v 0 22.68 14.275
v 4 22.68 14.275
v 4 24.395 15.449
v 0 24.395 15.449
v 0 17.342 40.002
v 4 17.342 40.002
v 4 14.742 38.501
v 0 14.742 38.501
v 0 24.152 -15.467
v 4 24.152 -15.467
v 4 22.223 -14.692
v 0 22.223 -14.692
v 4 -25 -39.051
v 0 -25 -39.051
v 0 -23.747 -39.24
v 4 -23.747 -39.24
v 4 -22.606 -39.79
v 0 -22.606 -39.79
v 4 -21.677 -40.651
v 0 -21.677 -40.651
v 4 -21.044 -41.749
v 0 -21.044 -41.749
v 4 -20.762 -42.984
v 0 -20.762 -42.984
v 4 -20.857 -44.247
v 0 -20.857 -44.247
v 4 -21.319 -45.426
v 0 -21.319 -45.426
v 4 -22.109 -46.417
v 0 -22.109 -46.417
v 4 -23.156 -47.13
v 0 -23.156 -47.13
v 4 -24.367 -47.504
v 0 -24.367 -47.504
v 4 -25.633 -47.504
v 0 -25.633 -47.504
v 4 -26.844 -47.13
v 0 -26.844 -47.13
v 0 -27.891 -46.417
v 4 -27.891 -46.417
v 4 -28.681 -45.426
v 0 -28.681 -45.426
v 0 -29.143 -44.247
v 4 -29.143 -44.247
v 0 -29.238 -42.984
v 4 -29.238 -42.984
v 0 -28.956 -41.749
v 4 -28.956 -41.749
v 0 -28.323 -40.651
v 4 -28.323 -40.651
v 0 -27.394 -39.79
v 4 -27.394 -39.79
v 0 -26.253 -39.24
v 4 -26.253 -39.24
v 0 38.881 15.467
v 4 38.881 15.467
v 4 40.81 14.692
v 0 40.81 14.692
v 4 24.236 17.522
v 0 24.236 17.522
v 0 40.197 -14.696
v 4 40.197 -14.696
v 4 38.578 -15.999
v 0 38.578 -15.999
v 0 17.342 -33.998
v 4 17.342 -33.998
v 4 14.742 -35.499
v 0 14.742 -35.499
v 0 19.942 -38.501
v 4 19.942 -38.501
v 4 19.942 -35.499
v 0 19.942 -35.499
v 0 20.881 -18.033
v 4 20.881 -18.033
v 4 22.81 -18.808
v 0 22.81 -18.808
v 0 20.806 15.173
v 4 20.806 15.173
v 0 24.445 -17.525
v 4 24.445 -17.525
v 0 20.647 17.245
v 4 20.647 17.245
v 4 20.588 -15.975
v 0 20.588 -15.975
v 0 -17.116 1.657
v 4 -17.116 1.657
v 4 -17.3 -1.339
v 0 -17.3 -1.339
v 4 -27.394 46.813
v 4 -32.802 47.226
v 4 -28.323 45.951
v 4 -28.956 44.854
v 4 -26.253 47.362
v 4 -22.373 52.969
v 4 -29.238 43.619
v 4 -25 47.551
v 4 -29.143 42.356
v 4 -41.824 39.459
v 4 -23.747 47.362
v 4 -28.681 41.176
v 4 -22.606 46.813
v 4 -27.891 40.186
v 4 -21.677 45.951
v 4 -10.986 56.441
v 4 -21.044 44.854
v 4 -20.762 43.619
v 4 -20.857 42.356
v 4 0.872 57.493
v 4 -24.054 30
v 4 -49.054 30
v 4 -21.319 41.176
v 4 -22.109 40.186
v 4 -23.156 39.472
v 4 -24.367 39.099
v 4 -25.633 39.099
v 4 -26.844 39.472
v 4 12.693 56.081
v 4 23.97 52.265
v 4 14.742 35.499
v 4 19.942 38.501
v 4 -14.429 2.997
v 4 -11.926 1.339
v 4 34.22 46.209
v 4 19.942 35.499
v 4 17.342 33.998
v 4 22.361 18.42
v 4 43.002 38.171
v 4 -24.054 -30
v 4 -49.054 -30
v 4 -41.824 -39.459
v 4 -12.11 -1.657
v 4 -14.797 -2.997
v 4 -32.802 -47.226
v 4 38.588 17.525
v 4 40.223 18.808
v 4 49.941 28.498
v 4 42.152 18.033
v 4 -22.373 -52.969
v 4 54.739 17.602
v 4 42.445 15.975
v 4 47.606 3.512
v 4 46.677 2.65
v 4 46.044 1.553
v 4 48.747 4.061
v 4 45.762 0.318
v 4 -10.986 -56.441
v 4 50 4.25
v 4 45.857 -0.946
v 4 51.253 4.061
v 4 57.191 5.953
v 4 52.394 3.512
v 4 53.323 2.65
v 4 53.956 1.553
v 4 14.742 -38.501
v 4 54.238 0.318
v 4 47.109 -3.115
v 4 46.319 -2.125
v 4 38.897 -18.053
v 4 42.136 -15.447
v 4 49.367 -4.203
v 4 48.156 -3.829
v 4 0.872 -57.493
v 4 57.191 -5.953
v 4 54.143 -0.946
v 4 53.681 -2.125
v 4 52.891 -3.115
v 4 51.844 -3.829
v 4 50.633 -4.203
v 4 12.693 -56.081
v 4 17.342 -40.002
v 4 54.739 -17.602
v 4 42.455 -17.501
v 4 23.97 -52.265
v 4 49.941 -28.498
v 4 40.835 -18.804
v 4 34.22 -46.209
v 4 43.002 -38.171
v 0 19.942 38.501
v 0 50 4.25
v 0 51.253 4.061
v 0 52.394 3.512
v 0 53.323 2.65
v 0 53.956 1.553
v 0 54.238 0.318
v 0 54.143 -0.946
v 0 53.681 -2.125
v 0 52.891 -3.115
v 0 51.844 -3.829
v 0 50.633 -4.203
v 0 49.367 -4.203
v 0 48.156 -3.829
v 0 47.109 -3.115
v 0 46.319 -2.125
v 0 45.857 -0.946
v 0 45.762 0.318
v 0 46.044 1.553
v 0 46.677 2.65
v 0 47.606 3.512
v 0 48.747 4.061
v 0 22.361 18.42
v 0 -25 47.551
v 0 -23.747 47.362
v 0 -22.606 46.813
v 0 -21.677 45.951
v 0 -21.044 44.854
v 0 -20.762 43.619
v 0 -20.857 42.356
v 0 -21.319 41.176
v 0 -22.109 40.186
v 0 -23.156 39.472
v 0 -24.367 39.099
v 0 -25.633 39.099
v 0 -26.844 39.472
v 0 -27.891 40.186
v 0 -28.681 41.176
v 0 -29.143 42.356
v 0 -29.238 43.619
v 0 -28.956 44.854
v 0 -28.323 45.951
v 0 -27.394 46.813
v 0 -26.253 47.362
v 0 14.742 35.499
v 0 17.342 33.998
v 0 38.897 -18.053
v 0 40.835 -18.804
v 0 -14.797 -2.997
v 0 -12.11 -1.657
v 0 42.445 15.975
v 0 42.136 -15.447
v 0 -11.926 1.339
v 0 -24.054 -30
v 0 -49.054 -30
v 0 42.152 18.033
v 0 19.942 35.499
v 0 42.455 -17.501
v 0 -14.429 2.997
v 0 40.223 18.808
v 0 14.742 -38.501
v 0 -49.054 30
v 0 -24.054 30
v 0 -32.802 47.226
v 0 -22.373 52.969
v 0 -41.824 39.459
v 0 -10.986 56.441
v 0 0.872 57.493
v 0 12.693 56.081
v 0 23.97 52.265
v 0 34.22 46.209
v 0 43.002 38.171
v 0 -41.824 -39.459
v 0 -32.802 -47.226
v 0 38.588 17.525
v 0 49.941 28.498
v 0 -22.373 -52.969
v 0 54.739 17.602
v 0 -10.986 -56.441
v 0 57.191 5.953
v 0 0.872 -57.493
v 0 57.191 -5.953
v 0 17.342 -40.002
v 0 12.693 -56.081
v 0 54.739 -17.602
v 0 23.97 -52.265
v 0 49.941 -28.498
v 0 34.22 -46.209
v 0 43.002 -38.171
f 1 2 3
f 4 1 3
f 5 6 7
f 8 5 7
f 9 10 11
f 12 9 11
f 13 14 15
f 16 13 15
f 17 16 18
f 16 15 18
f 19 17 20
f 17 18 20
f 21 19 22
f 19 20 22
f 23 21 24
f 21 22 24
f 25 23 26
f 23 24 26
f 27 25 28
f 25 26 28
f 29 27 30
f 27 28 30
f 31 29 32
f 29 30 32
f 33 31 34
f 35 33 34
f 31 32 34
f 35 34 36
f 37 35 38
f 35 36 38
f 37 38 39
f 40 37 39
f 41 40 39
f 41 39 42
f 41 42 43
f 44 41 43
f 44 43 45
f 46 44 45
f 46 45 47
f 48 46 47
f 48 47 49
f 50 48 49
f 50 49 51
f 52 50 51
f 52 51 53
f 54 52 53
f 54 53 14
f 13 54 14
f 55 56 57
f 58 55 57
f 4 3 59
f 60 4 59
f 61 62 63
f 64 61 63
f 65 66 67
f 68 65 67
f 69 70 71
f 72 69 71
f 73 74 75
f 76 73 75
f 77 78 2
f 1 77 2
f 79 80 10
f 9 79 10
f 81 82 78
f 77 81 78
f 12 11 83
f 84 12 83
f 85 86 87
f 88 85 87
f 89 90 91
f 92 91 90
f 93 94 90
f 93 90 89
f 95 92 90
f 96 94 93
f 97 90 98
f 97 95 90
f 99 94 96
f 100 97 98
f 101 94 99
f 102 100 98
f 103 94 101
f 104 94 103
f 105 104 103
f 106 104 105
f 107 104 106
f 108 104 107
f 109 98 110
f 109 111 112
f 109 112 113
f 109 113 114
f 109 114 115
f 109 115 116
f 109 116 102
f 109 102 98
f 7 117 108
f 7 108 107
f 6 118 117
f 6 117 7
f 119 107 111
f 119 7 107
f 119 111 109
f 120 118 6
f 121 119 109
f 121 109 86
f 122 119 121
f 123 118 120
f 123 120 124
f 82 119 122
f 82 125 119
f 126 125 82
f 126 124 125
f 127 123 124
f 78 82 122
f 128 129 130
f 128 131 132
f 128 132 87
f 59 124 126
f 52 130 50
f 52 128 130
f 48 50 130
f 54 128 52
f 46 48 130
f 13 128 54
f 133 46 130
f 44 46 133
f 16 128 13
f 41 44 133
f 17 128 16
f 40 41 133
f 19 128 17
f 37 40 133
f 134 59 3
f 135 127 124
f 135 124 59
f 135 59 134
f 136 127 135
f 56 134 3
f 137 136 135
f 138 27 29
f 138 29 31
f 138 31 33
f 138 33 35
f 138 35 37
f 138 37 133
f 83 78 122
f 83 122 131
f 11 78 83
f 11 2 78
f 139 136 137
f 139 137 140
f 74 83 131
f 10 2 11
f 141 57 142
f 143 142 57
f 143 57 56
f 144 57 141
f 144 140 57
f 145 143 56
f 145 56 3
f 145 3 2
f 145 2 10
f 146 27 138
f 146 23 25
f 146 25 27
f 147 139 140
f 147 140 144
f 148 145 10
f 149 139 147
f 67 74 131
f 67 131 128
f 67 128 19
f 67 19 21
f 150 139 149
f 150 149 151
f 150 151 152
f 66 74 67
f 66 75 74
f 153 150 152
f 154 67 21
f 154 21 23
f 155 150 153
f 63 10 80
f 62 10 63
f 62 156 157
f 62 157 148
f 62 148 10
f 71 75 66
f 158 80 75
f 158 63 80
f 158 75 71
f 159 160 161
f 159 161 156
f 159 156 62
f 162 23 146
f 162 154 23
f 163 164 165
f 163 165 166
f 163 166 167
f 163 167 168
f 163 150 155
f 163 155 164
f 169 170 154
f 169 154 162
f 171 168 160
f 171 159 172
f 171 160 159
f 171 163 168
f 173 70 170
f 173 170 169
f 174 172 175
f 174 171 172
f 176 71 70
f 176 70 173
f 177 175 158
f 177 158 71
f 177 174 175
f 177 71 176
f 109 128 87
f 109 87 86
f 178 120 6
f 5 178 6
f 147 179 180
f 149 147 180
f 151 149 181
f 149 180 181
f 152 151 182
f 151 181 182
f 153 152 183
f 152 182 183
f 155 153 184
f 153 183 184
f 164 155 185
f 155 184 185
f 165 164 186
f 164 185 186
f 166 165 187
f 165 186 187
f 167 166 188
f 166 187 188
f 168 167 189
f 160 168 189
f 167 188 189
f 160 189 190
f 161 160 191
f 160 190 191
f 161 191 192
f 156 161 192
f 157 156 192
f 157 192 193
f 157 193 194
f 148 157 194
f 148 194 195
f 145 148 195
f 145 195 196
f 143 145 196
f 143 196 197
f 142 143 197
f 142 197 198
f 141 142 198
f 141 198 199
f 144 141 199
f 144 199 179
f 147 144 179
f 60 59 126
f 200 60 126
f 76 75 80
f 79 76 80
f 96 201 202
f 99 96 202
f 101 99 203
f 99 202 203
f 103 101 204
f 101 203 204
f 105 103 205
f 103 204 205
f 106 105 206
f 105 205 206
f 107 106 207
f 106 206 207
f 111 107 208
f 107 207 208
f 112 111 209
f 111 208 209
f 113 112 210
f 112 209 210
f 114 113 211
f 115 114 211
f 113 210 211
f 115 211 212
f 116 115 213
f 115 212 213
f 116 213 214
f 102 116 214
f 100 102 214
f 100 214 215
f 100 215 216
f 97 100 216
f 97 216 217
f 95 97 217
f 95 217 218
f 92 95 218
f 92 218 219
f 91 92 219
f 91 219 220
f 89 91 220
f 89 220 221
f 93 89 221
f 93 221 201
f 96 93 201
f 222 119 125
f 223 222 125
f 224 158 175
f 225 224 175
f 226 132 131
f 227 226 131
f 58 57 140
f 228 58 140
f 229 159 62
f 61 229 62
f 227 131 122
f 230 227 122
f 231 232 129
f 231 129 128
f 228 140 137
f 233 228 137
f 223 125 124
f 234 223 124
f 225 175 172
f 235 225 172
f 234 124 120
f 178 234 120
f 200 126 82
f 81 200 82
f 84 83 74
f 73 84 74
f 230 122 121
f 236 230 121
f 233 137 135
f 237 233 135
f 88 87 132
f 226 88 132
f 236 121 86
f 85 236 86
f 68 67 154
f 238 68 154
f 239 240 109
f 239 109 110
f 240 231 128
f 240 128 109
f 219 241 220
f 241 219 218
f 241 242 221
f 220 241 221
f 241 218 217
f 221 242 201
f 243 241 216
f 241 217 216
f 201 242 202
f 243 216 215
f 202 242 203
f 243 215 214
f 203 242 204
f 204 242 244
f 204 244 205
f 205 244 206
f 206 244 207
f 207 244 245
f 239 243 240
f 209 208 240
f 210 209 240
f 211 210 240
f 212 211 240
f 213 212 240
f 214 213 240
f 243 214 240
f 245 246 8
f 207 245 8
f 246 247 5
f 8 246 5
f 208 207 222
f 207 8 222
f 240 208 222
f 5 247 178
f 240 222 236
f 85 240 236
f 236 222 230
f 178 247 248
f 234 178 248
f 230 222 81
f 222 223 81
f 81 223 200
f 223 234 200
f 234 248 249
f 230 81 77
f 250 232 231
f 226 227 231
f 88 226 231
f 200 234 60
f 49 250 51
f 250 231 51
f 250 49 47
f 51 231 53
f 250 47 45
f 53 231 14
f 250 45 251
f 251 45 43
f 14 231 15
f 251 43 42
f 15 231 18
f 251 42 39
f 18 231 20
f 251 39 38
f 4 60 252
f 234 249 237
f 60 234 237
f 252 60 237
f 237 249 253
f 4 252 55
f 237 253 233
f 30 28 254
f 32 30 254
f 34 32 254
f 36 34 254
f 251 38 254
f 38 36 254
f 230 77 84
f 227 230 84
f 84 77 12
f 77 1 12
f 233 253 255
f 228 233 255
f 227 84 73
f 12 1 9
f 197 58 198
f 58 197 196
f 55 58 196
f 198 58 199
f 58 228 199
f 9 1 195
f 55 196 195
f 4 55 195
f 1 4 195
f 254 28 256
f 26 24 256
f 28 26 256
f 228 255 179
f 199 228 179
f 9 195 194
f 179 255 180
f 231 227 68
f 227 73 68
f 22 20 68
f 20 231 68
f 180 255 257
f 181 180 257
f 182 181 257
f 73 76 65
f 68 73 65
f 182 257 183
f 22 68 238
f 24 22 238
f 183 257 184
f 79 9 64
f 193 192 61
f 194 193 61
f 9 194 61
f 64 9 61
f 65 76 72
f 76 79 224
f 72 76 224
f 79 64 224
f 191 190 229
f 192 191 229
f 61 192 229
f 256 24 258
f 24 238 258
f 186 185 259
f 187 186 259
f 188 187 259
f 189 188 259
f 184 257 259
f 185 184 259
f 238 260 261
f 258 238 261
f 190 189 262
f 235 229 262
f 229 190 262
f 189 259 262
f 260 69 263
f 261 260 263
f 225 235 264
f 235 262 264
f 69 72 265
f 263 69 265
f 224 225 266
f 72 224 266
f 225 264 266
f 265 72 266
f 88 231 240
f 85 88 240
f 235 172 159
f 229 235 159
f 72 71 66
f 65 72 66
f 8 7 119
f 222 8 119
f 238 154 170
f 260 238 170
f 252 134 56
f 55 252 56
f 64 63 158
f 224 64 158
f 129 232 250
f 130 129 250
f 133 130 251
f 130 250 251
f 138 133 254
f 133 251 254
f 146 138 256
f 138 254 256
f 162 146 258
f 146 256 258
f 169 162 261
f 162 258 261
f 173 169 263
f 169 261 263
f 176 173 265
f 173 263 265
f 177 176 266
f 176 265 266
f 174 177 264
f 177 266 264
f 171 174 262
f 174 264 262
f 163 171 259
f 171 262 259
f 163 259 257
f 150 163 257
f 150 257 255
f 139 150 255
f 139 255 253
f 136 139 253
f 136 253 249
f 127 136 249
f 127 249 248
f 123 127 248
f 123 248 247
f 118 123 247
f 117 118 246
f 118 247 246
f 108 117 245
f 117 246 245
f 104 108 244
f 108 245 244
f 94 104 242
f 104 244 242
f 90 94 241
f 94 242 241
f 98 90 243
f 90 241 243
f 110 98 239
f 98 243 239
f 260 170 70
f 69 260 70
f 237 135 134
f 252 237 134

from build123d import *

# Parameters (mm, degrees)
SKETCH1_R           = 57.5
BOSS_EXTRUDE1_DEPTH = 4
SKETCH2_R           = 4.25
CUT_EXTRUDE1_DEPTH  = 82.415600471
CUT_EXTRUDE2_DEPTH  = 82.415600471
CUT_EXTRUDE3_DEPTH  = 82.415600471


with BuildPart() as part:
    # Sketch1 → Boss-Extrude1 (new body)
    with BuildSketch(Plane(origin=(0, 0, 0), x_dir=(0, 0, -1), z_dir=(1, 0, 0))):
        Circle(SKETCH1_R)
    extrude(amount=BOSS_EXTRUDE1_DEPTH)

    # Sketch2 → Cut-Extrude1 (cut, through all)
    with BuildSketch(Plane.ZY):
        with Locations((0, 50)):
            Circle(SKETCH2_R)
        with Locations((43.301270189, -25)):
            Circle(SKETCH2_R)
        with Locations((-43.301270189, -25)):
            Circle(SKETCH2_R)
    extrude(amount=-CUT_EXTRUDE1_DEPTH, mode=Mode.SUBTRACT)

    # Sketch3 → Cut-Extrude2 (cut, through all)
    with BuildSketch(Plane.ZY):
        with BuildLine():
            Line((-30, -49.053542176), (-30, -24.053542176))
            Line((-30, -24.053542176), (30, -24.053542176))
            Line((30, -24.053542176), (30, -49.053542176))
            ThreePointArc((30, -49.053542176), (0, -57.5), (-30, -49.053542176))
        make_face()
    extrude(amount=-CUT_EXTRUDE2_DEPTH, mode=Mode.SUBTRACT)

    # Sketch4 → Cut-Extrude3 (cut, through all)
    with BuildSketch(Plane(origin=(4, 0, 0), x_dir=(0, 0, -1), z_dir=(1, 0, 0))):
        Polygon((15.999329975, 38.578303843), (18.05316756, 38.897288443), (18.803837585, 40.835456267), (17.500670025, 42.454639491), (15.44683244, 42.13565489), (14.696162415, 40.197487066), align=None)
        Polygon((-17.524724067, 38.587792684), (-15.467077039, 38.881201452), (-14.692352971, 40.809880435), (-15.975275933, 42.44515065), (-18.032922961, 42.151741882), (-18.807647029, 40.223062899), align=None)
        Polygon((15.975275933, 20.587792684), (18.032922961, 20.881201452), (18.807647029, 22.809880435), (17.524724067, 24.44515065), (15.467077039, 24.151741882), (14.692352971, 22.223062899), align=None)
        Polygon((-17.245318548, 20.646539693), (-15.172985813, 20.806029616), (-14.27494177, 22.680467371), (-15.449230462, 24.395415203), (-17.521563197, 24.235925281), (-18.41960724, 22.361487526), align=None)
        Polygon((33.9977786, 17.342133915), (35.4988893, 14.742133915), (38.5011107, 14.742133915), (40.0022214, 17.342133915), (38.5011107, 19.942133915), (35.4988893, 19.942133915), align=None)
        Polygon((-40.0022214, 17.342133915), (-38.5011107, 14.742133915), (-35.4988893, 14.742133915), (-33.9977786, 17.342133915), (-35.4988893, 19.942133915), (-38.5011107, 19.942133915), align=None)
        Polygon((-1.657389197, -17.116294048), (1.339206641, -17.299996833), (2.996595839, -14.796720104), (1.657389197, -12.109740591), (-1.339206641, -11.926037806), (-2.996595839, -14.429314535), align=None)
    extrude(amount=-CUT_EXTRUDE3_DEPTH, mode=Mode.SUBTRACT)


solid = part.part
